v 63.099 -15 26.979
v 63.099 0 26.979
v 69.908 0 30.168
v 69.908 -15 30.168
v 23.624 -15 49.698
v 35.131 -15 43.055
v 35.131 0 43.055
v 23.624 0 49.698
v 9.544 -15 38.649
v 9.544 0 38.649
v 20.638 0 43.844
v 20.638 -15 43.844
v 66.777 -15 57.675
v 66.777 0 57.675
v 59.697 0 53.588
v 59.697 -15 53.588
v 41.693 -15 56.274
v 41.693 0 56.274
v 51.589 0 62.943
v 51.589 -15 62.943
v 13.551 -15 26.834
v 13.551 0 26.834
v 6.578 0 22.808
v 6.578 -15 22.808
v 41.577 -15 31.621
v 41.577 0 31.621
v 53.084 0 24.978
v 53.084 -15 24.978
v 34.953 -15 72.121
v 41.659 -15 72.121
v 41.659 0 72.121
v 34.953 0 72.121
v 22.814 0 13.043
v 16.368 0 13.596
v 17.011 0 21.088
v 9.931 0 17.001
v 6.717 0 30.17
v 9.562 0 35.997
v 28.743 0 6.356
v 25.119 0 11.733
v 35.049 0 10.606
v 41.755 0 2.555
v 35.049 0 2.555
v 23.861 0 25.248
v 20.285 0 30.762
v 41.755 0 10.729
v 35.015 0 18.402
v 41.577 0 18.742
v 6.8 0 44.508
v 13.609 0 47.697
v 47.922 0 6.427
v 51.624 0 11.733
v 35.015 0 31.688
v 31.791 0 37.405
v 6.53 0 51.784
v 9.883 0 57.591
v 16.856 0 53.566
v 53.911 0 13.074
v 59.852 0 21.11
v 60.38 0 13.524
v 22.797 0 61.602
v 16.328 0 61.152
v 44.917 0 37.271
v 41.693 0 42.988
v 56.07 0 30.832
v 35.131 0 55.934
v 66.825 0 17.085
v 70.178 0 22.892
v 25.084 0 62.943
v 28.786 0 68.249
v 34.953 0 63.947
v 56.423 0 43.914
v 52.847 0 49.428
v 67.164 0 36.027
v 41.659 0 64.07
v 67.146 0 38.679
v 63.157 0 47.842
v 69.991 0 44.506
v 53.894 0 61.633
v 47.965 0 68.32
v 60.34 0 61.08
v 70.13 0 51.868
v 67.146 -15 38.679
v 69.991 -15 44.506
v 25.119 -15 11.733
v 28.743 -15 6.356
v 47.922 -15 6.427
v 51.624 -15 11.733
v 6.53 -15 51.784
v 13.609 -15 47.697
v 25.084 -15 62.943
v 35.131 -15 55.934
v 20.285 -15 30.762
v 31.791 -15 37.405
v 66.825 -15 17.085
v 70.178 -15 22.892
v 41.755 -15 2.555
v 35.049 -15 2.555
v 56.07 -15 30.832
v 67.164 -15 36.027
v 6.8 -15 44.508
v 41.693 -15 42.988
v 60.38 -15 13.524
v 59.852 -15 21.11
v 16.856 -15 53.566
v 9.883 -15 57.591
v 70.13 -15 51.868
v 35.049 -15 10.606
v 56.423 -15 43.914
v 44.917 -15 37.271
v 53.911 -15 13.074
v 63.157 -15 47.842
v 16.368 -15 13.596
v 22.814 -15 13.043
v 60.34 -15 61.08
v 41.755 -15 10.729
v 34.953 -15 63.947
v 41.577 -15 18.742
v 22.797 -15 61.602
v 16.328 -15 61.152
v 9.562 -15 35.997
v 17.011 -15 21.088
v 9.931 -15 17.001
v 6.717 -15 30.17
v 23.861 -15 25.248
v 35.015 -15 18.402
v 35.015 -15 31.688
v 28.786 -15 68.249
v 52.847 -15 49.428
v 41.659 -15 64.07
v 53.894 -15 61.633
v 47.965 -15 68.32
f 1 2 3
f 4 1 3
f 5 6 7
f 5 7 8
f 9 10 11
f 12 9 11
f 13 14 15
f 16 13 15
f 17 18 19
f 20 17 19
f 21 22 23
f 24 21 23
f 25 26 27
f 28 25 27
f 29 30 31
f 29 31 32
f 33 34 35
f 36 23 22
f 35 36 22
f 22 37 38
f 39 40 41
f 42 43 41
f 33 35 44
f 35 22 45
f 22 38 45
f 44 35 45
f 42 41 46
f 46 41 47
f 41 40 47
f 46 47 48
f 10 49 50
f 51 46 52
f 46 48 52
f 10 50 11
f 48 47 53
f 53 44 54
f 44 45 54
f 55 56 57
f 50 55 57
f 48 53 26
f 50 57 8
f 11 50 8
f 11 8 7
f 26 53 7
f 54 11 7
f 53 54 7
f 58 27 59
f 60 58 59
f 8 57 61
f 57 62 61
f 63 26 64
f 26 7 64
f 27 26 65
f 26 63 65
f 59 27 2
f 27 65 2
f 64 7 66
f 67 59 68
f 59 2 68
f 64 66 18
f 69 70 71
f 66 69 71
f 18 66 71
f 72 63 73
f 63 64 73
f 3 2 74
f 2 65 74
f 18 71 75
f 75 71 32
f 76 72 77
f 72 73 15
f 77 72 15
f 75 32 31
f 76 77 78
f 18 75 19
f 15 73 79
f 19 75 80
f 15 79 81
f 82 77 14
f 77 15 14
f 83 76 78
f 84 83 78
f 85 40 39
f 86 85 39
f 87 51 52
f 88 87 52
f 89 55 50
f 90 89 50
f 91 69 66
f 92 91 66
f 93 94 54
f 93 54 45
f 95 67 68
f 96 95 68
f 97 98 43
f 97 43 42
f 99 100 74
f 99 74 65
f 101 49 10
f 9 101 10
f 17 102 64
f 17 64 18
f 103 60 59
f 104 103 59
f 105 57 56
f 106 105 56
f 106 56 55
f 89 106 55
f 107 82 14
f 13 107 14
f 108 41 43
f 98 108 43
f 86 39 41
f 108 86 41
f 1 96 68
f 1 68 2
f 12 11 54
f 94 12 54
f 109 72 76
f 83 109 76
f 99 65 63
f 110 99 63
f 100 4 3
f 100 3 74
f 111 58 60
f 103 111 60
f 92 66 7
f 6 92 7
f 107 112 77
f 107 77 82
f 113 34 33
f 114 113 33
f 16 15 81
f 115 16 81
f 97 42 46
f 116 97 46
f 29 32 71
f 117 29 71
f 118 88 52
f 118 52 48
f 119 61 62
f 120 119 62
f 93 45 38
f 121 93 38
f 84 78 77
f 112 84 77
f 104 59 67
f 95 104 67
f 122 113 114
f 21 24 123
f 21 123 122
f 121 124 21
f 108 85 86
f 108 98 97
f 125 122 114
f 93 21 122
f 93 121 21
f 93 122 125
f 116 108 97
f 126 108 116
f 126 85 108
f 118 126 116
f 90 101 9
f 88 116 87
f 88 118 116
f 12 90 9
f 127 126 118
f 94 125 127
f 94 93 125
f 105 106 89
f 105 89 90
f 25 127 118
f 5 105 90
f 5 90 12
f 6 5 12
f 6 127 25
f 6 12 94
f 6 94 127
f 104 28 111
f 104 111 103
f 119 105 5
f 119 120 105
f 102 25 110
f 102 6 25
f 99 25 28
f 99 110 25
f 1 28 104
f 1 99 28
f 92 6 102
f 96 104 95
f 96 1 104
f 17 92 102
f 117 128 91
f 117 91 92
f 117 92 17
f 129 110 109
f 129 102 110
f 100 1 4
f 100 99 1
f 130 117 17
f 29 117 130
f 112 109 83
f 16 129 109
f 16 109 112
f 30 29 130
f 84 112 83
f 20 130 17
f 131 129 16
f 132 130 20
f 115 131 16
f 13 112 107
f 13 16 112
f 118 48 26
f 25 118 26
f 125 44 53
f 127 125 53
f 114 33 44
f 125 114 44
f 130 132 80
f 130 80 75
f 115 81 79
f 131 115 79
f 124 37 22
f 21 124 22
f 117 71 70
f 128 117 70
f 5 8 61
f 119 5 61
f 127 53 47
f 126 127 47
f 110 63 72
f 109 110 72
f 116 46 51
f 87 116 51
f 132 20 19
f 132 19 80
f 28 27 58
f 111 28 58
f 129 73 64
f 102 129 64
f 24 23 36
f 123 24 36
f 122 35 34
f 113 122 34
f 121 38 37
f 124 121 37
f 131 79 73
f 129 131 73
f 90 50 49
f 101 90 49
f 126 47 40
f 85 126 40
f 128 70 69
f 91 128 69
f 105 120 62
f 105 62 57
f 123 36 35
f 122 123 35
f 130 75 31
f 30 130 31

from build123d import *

# Parameters (mm, degrees)
F1_DEPTH = 15


with BuildPart() as f1:
    # F0 (on Front) → F1 (new body)
    with BuildSketch(Plane.XZ):
        Polygon((23.861149, 25.248436), (35.014816, 31.688008), (35.014816, 18.401567), (25.119459, 11.732958), (28.74309, 6.355957), (35.049491, 10.605923), (35.049491, 2.554659), (41.755129, 2.554659), (41.755129, 10.729081), (47.921799, 6.426754), (51.6238, 11.732958), (41.577444, 18.742041), (41.577444, 31.621186), (53.08384, 24.977965), (53.911346, 13.074031), (60.379781, 13.523686), (59.852403, 21.110173), (66.825002, 17.084541), (70.177821, 22.891793), (63.098564, 26.979004), (69.907824, 30.168334), (67.163517, 36.027463), (56.070295, 30.831605), (44.916629, 37.271177), (56.423024, 43.914398), (67.145887, 38.679072), (69.990691, 44.505729), (63.156912, 47.84225), (70.129511, 51.867882), (66.776692, 57.675134), (59.697435, 53.587923), (60.340024, 61.07958), (53.893716, 61.632505), (52.846851, 49.427564), (41.693184, 42.987992), (41.693184, 56.274433), (51.588541, 62.943042), (47.96491, 68.320043), (41.658509, 64.070077), (41.658509, 72.121341), (34.952871, 72.121341), (34.952871, 63.946919), (28.786201, 68.249246), (25.0842, 62.943042), (35.130556, 55.933959), (35.130556, 43.054814), (23.62416, 49.698035), (22.796654, 61.601969), (16.328219, 61.152314), (16.855597, 53.565827), (9.882998, 57.591459), (6.530179, 51.784207), (13.609436, 47.696996), (6.800176, 44.507666), (9.544483, 38.648537), (20.637705, 43.844395), (31.791371, 37.404823), (20.284976, 30.761602), (9.562113, 35.996928), (6.717309, 30.170271), (13.551088, 26.83375), (6.578489, 22.808118), (9.931308, 17.000866), (17.010565, 21.088077), (16.367976, 13.59642), (22.814284, 13.043495), align=None)
    extrude(amount=F1_DEPTH)


solid = f1.part
